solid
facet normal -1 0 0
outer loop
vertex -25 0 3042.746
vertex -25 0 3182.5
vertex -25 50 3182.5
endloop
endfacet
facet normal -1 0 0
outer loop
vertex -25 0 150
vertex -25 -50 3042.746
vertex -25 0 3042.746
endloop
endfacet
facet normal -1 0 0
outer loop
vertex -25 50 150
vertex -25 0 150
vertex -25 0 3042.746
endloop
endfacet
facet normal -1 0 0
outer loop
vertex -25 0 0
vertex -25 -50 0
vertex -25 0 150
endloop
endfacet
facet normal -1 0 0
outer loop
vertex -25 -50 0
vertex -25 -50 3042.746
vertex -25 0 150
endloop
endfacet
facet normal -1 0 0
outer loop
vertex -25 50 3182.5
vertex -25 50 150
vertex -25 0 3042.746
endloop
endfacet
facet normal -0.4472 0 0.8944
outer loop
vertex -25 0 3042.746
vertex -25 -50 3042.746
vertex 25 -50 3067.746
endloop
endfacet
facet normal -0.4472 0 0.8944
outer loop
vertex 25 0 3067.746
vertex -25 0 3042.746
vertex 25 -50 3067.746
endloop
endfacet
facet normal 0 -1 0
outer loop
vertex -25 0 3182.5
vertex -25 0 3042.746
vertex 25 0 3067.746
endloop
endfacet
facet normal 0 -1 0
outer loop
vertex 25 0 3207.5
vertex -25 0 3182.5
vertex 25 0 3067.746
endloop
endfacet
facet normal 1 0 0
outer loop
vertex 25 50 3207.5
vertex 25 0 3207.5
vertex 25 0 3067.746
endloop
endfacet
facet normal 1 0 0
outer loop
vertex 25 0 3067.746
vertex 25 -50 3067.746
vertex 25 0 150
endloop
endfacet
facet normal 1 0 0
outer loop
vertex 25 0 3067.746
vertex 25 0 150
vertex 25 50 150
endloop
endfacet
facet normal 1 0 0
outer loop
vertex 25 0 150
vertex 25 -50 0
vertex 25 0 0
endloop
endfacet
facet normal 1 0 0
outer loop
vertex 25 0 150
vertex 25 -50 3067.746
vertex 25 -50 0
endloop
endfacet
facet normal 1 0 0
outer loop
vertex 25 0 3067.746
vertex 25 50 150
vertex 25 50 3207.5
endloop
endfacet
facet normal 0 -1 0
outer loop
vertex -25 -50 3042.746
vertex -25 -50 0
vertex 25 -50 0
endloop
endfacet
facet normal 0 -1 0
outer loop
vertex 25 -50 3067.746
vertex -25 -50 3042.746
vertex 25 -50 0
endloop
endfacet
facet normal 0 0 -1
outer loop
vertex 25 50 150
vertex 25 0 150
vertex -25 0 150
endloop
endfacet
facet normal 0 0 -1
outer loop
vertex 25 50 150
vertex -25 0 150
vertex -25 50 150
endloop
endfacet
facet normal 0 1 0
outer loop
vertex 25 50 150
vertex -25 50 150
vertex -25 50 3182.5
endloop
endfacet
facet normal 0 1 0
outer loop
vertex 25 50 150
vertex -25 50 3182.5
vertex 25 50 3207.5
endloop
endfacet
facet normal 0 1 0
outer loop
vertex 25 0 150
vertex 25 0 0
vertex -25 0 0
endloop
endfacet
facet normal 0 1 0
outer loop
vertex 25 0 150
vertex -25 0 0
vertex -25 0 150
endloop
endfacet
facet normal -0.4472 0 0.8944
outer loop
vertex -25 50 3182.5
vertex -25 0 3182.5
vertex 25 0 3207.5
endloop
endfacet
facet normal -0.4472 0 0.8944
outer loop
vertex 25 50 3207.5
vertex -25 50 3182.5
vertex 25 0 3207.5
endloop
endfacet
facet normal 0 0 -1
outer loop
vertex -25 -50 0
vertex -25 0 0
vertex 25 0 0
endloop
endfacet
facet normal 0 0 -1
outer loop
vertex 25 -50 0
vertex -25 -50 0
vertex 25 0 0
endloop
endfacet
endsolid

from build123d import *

# Parameters (mm, degrees)
F0_W          = 50
F0_H          = 100
F1_DEPTH      = 3207.5
F2_W          = 50
F2_H          = 150
F3_DEPTH      = 25
F3_DEPTH_BACK = 25
F5_DEPTH      = 100
F7_DEPTH      = 50


with BuildPart() as f1:
    # F0 (on Top) → F1 (new body)
    with BuildSketch(Plane.XY):
        Rectangle(F0_W, F0_H)
    extrude(amount=F1_DEPTH)

    # F2 (on Right) → F3 (cut, two sides)
    with BuildSketch(Plane.YZ) as f3_sk:
        with Locations((25, 75)):
            Rectangle(F2_W, F2_H)
    extrude(amount=-F3_DEPTH, mode=Mode.SUBTRACT)
    extrude(f3_sk.sketch, amount=F3_DEPTH_BACK, mode=Mode.SUBTRACT)

    # F4 (on face) → F5 (cut, through all)
    with BuildSketch(Plane.XZ.offset(50)):
        Polygon((-25, 3182.5), (25, 3207.5), (-25, 3207.5), align=None)
    extrude(amount=-F5_DEPTH, mode=Mode.SUBTRACT)

    # F6 (on face) → F7 (cut)
    with BuildSketch(Plane.XZ.offset(50)):
        Polygon((-25, 3182.5), (-25, 3042.7457514063), (25, 3067.7457514063), (25, 3207.5), align=None)
    extrude(amount=-F7_DEPTH, mode=Mode.SUBTRACT)


solid = f1.part
